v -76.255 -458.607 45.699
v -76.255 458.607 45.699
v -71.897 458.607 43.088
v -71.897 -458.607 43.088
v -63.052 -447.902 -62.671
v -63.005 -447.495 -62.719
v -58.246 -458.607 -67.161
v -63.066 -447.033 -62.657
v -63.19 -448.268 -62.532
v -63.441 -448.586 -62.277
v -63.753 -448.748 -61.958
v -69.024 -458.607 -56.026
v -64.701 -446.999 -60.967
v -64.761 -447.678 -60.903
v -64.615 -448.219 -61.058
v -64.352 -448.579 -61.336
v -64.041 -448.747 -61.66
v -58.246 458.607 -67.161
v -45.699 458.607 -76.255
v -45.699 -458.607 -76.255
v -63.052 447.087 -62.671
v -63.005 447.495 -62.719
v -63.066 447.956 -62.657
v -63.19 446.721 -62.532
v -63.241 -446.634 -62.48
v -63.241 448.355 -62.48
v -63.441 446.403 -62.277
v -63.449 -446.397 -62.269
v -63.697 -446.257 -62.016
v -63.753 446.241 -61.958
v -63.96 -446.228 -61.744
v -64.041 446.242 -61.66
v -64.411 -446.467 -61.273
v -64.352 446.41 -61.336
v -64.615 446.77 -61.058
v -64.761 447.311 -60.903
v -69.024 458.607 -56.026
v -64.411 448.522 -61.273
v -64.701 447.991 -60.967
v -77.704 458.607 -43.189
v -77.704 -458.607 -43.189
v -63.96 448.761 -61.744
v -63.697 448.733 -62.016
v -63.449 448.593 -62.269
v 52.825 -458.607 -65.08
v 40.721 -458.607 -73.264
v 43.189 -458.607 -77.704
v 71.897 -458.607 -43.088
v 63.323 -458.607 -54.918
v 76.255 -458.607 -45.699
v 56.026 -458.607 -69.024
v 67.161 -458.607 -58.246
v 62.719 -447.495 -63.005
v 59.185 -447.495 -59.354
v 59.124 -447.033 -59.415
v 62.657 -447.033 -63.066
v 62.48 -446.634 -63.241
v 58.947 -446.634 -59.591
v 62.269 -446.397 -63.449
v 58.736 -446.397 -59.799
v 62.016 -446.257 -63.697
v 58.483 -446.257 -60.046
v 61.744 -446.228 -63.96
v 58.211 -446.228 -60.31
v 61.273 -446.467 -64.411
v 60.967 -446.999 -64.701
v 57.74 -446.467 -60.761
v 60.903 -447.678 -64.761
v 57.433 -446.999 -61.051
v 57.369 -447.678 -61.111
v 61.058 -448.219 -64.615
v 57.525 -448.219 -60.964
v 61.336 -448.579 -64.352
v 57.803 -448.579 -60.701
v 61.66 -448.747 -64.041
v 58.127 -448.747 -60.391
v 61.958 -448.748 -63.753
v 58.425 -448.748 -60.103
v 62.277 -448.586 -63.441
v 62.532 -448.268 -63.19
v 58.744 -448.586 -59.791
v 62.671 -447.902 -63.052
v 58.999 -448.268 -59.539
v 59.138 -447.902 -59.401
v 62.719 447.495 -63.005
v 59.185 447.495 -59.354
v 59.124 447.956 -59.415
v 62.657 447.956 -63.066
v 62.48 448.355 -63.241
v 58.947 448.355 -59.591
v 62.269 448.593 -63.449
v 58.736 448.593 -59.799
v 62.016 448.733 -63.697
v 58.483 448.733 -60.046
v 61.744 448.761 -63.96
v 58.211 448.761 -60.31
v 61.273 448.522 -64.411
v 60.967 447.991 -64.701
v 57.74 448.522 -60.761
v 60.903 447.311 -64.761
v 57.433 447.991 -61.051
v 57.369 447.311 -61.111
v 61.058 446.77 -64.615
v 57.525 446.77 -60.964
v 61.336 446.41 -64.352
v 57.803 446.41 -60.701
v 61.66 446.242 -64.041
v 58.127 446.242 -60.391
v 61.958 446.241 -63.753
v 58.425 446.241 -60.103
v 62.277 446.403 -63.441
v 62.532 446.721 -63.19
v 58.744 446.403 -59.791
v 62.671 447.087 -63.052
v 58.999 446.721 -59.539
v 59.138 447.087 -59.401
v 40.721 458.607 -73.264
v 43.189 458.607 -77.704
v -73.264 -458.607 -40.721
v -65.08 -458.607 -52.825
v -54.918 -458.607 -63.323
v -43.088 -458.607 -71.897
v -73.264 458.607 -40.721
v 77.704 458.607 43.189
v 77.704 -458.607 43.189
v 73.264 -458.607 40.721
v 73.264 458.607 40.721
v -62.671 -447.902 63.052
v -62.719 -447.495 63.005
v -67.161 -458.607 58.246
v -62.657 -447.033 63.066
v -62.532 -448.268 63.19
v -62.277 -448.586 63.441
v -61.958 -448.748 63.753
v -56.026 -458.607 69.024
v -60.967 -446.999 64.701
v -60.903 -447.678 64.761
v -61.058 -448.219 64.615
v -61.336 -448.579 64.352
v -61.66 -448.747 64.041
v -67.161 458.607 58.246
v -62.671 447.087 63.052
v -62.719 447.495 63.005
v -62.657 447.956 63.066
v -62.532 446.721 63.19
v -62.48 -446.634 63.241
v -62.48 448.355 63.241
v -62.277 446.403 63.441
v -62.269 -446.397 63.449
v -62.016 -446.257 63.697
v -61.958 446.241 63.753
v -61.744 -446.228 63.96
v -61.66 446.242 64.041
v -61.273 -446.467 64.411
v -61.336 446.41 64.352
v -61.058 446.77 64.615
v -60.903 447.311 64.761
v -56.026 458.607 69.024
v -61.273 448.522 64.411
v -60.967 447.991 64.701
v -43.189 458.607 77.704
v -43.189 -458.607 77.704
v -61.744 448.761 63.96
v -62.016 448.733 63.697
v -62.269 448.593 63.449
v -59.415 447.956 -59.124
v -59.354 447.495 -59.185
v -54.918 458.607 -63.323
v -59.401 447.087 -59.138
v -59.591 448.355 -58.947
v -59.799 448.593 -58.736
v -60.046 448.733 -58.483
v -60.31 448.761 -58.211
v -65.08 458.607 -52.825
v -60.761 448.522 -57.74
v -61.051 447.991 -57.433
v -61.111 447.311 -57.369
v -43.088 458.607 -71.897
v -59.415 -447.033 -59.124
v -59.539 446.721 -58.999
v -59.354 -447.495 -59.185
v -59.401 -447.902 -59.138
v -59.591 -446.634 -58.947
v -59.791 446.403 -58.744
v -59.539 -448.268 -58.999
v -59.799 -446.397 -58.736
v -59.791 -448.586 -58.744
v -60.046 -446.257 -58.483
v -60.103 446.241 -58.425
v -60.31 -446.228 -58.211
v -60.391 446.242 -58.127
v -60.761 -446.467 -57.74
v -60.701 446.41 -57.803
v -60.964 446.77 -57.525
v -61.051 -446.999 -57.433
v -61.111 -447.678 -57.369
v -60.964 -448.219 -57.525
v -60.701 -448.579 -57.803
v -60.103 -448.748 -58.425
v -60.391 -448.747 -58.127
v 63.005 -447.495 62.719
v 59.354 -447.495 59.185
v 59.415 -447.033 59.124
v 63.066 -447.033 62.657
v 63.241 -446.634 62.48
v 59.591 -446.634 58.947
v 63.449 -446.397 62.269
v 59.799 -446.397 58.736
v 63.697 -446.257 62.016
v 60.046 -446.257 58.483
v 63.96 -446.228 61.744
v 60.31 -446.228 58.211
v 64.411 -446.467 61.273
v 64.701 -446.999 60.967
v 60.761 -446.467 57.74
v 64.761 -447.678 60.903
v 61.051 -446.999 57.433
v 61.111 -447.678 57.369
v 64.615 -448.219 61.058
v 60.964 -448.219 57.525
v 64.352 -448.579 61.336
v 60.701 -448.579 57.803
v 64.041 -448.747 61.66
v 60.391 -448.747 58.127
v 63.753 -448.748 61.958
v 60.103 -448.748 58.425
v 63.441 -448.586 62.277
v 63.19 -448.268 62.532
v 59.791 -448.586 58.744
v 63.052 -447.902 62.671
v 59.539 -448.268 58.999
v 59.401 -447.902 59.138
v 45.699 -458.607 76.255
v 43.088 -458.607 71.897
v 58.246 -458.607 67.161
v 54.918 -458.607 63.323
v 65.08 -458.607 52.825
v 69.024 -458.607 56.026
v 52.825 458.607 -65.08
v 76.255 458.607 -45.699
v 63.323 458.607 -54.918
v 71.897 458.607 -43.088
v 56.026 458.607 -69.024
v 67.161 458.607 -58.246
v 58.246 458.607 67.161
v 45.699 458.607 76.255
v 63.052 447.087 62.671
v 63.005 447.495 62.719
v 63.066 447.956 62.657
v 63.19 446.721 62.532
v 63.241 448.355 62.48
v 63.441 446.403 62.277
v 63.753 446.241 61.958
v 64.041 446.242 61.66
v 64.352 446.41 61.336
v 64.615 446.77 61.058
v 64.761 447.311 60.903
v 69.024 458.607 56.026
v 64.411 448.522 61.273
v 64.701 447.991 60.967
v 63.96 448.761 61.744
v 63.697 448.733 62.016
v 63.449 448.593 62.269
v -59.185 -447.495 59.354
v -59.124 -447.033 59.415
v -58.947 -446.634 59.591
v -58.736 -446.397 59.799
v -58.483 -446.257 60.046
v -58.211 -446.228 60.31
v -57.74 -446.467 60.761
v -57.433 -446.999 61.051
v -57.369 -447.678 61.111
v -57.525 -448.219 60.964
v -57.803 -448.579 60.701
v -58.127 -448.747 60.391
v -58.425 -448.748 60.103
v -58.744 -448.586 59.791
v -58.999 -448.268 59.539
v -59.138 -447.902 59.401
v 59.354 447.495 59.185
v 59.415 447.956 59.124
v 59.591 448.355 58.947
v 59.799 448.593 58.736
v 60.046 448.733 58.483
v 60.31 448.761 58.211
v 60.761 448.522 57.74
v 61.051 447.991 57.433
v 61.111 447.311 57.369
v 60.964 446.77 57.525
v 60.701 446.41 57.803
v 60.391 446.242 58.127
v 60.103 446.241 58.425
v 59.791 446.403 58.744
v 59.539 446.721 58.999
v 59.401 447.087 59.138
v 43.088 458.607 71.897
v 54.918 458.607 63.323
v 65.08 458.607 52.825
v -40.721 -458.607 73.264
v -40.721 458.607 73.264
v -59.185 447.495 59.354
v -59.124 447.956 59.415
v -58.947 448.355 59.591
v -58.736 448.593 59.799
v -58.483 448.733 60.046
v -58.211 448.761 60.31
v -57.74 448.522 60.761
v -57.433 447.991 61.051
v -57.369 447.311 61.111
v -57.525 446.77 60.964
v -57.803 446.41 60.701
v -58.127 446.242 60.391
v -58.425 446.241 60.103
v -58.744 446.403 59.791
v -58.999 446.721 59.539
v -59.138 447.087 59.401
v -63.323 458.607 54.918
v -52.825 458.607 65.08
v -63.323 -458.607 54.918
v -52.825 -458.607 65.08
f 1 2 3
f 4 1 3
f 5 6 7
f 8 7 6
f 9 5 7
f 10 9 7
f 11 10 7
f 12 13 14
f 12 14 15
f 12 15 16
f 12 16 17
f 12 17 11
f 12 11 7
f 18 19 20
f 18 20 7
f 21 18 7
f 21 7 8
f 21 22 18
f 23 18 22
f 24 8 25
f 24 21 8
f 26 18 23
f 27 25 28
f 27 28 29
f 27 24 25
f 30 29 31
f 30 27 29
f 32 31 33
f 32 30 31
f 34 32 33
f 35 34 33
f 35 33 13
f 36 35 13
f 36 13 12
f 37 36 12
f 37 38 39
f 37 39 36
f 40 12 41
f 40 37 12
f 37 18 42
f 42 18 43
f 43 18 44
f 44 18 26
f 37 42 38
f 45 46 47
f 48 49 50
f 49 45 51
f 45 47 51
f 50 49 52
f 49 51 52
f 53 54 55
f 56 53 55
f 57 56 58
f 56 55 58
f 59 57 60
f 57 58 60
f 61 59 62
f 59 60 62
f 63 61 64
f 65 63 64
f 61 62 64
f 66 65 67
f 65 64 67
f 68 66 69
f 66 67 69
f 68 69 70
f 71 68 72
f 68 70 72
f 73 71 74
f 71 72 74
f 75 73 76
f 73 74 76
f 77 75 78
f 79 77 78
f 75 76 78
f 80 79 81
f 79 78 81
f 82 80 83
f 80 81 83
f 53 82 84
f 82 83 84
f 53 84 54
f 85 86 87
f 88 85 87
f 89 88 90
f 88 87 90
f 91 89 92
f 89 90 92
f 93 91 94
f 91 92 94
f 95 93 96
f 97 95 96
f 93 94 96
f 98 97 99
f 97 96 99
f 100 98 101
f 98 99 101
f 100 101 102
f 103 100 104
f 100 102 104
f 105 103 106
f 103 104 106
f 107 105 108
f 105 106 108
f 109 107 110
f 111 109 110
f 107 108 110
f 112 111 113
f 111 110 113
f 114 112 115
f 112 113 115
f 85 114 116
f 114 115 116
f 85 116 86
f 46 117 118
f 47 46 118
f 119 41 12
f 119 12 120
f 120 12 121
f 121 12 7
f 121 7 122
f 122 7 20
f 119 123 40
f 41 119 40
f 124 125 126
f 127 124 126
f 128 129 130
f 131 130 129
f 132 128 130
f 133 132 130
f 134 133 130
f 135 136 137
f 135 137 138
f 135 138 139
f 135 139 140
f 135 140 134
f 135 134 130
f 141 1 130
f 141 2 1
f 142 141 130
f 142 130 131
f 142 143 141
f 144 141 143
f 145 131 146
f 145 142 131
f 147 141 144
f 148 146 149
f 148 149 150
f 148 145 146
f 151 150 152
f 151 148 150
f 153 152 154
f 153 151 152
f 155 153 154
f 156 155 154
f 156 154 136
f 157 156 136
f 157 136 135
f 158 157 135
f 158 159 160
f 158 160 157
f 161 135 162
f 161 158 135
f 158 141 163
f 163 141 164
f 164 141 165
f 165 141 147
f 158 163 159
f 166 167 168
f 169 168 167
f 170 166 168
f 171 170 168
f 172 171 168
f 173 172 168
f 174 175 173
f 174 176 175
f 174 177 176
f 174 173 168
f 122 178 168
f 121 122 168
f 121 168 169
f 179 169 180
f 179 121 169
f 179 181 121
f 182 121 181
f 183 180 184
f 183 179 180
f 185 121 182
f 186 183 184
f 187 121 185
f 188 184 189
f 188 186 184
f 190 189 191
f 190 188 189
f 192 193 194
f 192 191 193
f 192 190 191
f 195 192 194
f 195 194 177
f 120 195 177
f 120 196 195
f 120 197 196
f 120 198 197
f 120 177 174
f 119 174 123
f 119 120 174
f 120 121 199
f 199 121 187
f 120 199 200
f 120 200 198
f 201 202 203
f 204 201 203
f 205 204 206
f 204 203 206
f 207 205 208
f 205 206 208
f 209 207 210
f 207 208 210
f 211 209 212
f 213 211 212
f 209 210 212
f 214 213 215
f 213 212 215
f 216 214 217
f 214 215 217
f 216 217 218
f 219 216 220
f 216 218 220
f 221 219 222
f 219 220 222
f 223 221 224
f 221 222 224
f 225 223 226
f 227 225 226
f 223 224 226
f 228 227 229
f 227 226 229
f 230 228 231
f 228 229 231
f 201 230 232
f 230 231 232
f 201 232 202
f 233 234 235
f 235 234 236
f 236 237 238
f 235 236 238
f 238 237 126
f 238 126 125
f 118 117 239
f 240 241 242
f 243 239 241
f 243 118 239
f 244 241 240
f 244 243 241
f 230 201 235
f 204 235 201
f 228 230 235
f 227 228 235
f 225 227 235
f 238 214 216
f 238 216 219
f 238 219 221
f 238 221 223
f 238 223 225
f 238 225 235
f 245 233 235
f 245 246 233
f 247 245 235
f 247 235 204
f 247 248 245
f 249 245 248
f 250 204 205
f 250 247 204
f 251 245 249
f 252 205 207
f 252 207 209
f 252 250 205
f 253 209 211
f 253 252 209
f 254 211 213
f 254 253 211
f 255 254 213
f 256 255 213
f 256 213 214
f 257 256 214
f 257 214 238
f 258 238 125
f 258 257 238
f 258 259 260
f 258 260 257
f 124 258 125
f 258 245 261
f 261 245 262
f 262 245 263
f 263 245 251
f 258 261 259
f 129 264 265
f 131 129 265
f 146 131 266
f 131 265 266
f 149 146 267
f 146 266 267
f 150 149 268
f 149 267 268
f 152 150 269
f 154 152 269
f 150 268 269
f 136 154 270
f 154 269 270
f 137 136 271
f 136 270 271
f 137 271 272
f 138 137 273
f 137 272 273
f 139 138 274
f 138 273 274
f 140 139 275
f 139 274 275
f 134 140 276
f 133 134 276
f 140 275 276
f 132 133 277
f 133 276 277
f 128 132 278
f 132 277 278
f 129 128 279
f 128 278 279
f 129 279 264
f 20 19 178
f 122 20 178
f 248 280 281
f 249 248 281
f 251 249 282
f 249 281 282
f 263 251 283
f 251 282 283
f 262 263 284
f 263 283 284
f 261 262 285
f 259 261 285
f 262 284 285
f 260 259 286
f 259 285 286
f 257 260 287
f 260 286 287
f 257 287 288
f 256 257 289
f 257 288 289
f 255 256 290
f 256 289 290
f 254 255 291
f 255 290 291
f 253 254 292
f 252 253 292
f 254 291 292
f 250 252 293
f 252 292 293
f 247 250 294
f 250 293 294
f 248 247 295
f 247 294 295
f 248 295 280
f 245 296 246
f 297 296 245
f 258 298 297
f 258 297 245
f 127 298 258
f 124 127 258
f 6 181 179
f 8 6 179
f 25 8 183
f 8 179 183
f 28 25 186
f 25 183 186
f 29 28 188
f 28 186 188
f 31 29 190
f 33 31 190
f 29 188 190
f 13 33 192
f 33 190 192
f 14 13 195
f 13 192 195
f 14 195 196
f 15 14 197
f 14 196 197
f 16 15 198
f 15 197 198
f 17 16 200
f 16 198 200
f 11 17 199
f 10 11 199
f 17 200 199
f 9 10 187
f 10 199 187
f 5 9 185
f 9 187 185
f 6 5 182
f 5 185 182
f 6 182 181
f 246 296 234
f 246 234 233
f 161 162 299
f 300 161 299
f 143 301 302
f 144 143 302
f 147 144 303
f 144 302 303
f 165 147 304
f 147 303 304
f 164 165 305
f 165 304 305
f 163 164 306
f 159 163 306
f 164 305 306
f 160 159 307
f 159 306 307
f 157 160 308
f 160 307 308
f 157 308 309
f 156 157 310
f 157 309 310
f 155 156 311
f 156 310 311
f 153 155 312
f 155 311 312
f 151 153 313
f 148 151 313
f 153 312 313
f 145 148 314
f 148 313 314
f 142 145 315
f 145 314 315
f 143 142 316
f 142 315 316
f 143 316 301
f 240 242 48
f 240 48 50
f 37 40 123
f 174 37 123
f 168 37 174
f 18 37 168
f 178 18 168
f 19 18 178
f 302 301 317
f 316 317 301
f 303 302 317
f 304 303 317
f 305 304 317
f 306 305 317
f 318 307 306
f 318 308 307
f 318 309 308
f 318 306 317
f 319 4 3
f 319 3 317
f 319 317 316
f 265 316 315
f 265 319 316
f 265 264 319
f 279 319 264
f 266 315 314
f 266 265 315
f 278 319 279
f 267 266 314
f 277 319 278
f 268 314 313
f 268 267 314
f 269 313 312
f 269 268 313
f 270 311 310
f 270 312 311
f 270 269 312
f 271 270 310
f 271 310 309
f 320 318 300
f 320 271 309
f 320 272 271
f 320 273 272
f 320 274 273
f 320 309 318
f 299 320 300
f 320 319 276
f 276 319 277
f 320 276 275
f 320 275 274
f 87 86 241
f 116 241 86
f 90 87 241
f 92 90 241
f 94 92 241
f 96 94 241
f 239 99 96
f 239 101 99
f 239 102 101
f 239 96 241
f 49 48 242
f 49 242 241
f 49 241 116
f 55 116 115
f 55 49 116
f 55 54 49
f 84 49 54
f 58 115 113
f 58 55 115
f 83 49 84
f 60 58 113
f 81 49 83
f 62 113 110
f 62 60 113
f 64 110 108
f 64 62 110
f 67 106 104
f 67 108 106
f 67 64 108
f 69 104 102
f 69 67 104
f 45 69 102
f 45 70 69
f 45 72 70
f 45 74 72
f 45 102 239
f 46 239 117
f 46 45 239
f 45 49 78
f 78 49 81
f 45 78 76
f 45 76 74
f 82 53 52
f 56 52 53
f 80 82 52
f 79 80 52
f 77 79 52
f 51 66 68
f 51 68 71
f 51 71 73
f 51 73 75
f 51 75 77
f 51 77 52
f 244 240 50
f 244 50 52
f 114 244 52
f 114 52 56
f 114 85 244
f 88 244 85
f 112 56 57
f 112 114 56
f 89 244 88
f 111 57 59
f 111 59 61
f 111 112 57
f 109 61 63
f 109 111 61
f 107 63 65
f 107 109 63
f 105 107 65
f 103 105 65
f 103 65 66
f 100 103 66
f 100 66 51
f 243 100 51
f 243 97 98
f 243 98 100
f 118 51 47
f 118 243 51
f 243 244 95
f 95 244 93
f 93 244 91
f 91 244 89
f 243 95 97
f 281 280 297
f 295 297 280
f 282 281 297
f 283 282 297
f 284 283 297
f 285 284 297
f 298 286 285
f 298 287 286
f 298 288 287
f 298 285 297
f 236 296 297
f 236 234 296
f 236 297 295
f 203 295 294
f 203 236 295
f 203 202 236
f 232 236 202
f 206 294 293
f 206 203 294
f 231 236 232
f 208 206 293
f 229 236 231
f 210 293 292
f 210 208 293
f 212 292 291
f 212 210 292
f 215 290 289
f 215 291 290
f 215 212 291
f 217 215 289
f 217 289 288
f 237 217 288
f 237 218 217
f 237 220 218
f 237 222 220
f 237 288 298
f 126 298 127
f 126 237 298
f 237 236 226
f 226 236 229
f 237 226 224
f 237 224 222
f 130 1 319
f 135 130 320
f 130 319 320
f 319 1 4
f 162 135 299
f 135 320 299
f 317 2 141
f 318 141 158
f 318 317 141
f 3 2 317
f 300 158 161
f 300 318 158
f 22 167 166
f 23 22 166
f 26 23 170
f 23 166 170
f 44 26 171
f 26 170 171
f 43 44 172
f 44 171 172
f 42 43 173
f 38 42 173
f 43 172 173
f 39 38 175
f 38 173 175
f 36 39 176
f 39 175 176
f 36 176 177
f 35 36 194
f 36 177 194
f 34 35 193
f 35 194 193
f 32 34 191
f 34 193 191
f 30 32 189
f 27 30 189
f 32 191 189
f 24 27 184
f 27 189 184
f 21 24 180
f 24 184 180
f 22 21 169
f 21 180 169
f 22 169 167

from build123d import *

# Parameters (mm, degrees)
SKETCH2_R               = 88.9
SKETCH2_R_2             = 83.82
BOSS_EXTRUDE1_DEPTH     = 458.60716
CUT_EXTRUDE1_DEPTH      = 459.60716
CUT_EXTRUDE1_DEPTH_BACK = 459.60716
SKETCH5_R               = 1.27
BOLT_HOLES_DEPTH        = 29.911624556
BOLT_PATTERN_COUNT      = 4


with BuildPart() as part:
    # Sketch2 → Boss-Extrude1 (new body, symmetric)
    with BuildSketch(Plane(origin=(0, 0, 0), x_dir=(1, 0, 0), z_dir=(0, 1, 0))):
        Circle(SKETCH2_R)
        Circle(SKETCH2_R_2, mode=Mode.SUBTRACT)
    extrude(amount=BOSS_EXTRUDE1_DEPTH, both=True)

    # Sketch3 → Cut-Extrude1 (cut, two sides)
    with BuildSketch(Plane(origin=(0, 0, 0), x_dir=(1, 0, 0), z_dir=(0, 1, 0))) as cut_extrude1_sk:
        Polygon((169.661755759, -94.300371224), (0, 0), (169.661755759, 101.677593364), align=None)
        Polygon((0, 0), (53.900027233, 96.974944394), (-58.116685864, 96.974944394), align=None)
        Polygon((-123.741299607, 68.777140945), (-123.741299607, -74.157652604), (0, 0), align=None)
        Polygon((-65.840936026, -118.45858783), (0, 0), (70.991745134, -118.45858783), align=None)
    extrude(amount=CUT_EXTRUDE1_DEPTH, mode=Mode.SUBTRACT)
    extrude(cut_extrude1_sk.sketch, amount=-CUT_EXTRUDE1_DEPTH_BACK, mode=Mode.SUBTRACT)

    # Sketch5 → Bolt holes (cut, through all)
    with BuildSketch(Plane(origin=(-56.309218645, 0, 58.175814955), x_dir=(-0.718540152, 0, -0.695485478), z_dir=(0.695485478, 0, -0.718540152))):
        with Locations((-0.02278764, 447.49466)):
            Circle(SKETCH5_R)
        with Locations((-0.02278764, -447.49466)):
            Circle(SKETCH5_R)
    bolt_holes = extrude(amount=-BOLT_HOLES_DEPTH, mode=Mode.SUBTRACT)

    # Bolt pattern: Bolt holes ×4 about axis
    bolt_pattern_axis = Axis((0, 458.60716, 0), (0, 1, 0))
    for i in range(1, BOLT_PATTERN_COUNT):
        add(bolt_holes.rotate(bolt_pattern_axis, i * 360 / BOLT_PATTERN_COUNT), mode=Mode.SUBTRACT)


solid = part.part
